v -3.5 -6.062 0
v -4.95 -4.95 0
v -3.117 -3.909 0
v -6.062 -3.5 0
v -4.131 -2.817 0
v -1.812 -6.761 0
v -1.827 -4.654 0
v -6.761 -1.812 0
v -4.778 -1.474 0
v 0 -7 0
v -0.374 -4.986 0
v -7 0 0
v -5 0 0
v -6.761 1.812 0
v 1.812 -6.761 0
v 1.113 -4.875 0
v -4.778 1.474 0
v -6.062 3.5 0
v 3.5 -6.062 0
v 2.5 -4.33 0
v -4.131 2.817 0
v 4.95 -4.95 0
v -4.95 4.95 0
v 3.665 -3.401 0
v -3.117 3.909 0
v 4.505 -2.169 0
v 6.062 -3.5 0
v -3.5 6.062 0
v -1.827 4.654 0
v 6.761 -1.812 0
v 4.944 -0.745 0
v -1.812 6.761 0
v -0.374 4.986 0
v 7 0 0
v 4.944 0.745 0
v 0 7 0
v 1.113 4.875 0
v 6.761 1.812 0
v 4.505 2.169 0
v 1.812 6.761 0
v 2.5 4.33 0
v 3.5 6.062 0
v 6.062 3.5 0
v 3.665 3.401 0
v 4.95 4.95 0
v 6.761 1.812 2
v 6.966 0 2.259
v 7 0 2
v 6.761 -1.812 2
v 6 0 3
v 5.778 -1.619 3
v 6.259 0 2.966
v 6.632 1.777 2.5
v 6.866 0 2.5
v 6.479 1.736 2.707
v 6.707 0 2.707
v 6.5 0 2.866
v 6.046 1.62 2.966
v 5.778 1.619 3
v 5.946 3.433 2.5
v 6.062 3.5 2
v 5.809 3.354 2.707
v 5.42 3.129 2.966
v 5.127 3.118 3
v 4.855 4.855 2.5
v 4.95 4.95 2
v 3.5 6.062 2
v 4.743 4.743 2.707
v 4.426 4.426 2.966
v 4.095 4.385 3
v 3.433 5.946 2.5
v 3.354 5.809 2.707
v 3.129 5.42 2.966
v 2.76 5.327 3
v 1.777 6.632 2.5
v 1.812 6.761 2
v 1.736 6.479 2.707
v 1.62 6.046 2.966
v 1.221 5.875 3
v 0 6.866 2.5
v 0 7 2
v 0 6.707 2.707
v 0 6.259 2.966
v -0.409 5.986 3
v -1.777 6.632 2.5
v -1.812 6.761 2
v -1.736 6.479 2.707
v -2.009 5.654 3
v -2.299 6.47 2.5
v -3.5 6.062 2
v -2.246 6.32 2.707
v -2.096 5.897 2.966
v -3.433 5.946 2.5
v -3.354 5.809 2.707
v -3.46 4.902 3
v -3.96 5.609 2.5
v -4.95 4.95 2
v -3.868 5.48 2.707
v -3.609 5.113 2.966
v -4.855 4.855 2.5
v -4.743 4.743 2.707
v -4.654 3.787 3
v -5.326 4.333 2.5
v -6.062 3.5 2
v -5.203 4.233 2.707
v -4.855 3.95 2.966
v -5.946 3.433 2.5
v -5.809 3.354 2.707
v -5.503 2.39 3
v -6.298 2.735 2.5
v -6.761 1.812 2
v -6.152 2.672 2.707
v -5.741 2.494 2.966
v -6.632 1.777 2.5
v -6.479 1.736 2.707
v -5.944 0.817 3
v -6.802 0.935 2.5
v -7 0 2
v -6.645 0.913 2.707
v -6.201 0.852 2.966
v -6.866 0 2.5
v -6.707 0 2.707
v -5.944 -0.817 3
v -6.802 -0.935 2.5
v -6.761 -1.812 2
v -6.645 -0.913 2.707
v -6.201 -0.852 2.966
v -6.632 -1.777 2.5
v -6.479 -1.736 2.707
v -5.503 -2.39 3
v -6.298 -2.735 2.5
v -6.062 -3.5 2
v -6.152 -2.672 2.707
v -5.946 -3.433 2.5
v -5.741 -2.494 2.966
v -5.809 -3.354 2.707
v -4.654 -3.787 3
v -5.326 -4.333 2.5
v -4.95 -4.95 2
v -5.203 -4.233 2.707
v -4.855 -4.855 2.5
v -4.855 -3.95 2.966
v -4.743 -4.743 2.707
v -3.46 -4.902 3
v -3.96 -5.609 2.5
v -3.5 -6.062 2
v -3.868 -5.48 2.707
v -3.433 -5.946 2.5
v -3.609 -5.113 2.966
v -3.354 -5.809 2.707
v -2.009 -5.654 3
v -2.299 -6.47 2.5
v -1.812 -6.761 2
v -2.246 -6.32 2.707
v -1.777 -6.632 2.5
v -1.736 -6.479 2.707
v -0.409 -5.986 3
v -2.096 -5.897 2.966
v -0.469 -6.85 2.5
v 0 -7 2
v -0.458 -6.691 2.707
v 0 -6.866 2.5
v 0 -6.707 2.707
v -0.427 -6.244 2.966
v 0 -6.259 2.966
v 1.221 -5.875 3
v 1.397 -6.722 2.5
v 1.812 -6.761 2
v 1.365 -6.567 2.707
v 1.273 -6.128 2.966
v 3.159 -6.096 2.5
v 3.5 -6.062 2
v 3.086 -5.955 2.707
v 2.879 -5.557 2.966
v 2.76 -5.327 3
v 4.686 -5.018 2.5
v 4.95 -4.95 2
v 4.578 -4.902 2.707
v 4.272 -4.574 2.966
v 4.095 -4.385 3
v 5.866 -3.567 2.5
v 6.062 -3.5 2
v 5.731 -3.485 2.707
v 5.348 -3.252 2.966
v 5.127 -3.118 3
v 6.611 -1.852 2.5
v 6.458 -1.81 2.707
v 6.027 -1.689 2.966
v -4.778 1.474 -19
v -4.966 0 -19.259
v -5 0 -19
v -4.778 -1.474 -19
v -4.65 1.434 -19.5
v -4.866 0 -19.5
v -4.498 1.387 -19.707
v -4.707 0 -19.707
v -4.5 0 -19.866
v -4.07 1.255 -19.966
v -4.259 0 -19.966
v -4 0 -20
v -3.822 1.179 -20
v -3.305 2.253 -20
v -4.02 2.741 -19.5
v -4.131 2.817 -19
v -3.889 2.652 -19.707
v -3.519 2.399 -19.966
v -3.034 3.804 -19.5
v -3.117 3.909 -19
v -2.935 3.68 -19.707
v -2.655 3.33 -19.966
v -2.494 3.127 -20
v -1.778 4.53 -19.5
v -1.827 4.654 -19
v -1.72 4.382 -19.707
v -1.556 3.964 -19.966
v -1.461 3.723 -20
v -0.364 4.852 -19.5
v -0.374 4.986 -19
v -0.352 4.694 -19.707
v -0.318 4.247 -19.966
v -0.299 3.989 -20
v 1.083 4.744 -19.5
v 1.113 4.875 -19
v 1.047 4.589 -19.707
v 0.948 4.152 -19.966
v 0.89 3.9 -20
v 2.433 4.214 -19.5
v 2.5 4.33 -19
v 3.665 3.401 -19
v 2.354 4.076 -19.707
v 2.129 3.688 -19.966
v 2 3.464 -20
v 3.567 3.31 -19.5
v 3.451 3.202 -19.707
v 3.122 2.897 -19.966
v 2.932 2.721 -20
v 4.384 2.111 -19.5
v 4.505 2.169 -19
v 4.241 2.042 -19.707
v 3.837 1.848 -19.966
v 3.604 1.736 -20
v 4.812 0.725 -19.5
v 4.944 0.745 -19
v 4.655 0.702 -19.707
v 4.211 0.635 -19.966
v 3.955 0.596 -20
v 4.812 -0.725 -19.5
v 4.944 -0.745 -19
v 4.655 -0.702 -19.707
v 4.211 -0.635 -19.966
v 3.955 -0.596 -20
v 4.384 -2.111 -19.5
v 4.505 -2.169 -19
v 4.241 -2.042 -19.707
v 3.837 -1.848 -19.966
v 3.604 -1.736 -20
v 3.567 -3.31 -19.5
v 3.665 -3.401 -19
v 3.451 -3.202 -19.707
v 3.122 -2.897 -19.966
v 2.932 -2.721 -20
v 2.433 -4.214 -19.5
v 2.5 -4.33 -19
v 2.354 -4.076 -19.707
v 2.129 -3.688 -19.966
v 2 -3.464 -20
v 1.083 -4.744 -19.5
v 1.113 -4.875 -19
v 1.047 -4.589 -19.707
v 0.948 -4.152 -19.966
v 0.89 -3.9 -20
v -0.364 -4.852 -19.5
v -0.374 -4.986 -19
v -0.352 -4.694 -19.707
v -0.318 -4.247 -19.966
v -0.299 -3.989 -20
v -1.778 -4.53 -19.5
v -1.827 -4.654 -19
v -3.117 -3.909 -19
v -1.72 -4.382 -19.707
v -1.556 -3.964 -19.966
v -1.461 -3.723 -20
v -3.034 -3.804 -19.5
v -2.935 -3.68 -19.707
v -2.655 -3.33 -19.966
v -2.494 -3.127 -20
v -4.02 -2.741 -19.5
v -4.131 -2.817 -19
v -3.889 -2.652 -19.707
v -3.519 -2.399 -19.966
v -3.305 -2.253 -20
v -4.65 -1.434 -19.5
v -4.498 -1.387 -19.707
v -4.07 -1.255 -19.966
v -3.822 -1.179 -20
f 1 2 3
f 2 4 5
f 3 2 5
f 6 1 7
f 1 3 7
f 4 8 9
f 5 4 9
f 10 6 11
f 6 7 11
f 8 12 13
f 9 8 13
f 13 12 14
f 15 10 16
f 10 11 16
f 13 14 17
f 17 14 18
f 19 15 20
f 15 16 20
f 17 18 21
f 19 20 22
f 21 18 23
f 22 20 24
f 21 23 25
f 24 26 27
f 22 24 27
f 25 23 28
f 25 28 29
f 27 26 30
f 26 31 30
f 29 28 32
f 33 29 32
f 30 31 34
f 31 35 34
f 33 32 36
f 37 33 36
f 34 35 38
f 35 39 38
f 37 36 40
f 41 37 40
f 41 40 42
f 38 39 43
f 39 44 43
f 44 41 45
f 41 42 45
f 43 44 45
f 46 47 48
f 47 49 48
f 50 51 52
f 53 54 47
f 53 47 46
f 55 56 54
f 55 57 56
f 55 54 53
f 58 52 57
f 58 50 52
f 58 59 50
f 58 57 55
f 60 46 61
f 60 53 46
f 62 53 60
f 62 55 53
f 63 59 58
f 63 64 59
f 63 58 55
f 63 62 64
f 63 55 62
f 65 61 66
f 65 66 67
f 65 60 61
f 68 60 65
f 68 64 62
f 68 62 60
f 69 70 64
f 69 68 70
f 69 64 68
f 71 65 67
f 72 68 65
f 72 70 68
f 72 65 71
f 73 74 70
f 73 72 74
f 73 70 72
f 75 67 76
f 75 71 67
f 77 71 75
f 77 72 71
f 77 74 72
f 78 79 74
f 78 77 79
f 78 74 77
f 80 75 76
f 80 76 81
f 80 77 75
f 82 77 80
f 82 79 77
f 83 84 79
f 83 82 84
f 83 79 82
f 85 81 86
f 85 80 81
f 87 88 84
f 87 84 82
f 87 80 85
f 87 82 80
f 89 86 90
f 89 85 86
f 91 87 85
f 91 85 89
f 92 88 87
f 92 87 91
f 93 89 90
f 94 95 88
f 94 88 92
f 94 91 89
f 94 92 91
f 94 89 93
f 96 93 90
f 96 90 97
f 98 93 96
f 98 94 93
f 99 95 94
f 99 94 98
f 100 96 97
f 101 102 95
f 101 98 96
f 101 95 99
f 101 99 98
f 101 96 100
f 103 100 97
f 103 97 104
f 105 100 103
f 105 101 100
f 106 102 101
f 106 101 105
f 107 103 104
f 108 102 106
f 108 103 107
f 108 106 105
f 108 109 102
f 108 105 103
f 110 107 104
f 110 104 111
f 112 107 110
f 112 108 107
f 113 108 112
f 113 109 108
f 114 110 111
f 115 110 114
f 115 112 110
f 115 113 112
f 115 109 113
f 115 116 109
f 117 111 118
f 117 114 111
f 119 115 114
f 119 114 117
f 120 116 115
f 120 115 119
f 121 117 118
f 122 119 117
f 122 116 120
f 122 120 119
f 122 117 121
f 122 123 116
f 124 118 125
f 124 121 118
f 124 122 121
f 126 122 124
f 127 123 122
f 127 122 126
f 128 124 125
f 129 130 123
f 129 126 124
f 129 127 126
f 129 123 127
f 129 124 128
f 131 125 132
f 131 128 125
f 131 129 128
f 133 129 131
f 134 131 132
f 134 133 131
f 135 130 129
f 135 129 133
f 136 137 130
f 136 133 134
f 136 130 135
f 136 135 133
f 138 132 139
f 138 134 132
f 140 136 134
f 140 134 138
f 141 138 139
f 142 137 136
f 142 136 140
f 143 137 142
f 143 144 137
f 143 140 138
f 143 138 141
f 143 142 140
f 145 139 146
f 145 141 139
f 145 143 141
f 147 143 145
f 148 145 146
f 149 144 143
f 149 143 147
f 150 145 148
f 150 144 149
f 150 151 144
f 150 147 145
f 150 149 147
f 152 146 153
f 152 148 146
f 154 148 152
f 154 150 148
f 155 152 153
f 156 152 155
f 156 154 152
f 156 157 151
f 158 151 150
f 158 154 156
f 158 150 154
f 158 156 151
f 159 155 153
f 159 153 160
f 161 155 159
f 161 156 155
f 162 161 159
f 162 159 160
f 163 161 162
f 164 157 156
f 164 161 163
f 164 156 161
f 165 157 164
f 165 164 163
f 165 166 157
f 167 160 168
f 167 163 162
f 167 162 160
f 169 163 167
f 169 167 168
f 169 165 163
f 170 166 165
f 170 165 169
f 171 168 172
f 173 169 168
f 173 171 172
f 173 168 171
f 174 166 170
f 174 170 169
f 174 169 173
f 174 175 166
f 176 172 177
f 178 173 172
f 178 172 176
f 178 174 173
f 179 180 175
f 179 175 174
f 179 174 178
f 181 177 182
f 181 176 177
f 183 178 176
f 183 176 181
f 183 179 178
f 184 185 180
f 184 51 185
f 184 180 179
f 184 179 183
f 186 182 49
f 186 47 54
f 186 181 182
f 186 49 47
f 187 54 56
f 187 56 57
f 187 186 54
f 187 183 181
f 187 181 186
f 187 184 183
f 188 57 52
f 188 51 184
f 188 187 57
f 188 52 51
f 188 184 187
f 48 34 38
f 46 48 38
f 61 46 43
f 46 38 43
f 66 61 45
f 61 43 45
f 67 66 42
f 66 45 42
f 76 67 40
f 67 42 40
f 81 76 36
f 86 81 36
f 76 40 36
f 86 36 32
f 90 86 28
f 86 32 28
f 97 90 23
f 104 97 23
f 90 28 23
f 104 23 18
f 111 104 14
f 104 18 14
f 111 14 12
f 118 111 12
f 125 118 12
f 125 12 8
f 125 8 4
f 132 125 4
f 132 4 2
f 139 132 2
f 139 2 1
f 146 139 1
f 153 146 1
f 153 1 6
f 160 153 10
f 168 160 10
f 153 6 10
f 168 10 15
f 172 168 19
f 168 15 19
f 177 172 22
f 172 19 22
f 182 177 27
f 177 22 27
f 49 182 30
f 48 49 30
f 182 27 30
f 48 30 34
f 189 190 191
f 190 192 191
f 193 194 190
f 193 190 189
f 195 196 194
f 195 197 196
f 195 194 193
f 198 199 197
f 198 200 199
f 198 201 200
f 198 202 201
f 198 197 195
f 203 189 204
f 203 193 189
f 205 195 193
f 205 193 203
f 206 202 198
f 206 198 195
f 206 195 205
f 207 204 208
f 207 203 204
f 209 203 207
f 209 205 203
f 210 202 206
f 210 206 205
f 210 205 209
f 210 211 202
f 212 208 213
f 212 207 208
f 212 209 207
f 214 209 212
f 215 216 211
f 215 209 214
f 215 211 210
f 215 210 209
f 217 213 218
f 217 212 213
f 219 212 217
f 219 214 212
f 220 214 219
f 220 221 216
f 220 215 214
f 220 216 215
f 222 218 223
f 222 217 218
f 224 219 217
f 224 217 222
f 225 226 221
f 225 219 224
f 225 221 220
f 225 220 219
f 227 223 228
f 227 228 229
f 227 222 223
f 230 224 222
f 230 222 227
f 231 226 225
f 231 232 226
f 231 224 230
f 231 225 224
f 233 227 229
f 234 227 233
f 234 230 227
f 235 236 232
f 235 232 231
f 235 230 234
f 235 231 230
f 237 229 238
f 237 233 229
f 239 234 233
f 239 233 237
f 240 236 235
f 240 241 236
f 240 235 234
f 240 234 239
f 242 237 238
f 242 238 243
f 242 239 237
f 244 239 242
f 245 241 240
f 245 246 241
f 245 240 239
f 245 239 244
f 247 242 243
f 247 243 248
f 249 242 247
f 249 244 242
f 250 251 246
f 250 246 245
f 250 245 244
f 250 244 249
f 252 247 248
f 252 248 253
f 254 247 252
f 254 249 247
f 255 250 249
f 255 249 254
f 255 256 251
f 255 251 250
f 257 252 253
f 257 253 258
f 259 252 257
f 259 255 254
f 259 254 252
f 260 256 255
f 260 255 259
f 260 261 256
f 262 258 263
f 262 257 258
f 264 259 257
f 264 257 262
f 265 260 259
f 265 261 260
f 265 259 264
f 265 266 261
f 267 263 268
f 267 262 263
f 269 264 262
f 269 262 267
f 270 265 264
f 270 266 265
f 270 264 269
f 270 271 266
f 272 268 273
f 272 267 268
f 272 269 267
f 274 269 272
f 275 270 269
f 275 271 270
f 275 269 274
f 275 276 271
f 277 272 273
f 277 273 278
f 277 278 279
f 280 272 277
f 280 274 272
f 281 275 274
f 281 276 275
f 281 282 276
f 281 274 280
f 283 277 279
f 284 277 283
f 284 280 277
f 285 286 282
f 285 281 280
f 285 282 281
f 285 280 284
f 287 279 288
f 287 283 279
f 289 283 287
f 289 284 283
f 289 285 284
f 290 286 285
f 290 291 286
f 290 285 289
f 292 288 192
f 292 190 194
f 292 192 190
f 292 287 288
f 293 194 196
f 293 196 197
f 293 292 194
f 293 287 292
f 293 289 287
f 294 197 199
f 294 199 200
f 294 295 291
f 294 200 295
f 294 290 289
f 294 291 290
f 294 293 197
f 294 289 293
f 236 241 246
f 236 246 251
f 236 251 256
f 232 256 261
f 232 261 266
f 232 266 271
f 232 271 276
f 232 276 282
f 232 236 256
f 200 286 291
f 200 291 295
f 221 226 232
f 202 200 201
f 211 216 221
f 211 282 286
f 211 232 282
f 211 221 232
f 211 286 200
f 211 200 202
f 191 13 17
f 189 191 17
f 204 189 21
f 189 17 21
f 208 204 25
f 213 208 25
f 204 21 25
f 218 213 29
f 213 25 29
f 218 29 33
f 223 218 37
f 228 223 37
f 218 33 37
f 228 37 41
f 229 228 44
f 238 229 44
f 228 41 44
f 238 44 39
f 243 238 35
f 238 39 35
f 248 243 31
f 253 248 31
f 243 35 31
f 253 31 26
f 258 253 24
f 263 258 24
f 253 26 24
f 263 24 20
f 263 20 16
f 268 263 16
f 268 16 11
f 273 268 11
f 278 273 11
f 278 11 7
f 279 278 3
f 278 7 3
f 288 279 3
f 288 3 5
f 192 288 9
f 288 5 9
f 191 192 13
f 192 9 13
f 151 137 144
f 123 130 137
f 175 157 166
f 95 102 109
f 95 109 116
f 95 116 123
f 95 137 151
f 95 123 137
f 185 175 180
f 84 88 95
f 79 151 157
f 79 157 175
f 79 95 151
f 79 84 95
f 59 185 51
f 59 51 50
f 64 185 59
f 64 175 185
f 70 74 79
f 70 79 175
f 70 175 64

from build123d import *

# Parameters (mm, degrees)
SKICA1_R                = 7
P_IDAT_VYSUNUT_M1_DEPTH = 3
SKICA2_R                = 5
P_IDAT_VYSUNUT_M2_DEPTH = 20
ZAOBLIT1_R              = 1


with BuildPart() as part:
    # Skica1 → Přidat vysunutím1 (new body)
    with BuildSketch(Plane.XY):
        Circle(SKICA1_R)
    extrude(amount=P_IDAT_VYSUNUT_M1_DEPTH)

    # Skica2 → Přidat vysunutím2 (add)
    with BuildSketch(Plane(origin=(0, 0, 0), x_dir=(-1, 0, 0), z_dir=(0, 0, -1))):
        Circle(SKICA2_R)
    extrude(amount=P_IDAT_VYSUNUT_M2_DEPTH)

    # Zaoblit1
    zaoblit1_edges = [part.edges().sort_by_distance(p)[0] for p in [
        (-7, 0, 3),
        (5, 0, -20),
    ]]
    fillet(zaoblit1_edges, radius=ZAOBLIT1_R)


solid = part.part
